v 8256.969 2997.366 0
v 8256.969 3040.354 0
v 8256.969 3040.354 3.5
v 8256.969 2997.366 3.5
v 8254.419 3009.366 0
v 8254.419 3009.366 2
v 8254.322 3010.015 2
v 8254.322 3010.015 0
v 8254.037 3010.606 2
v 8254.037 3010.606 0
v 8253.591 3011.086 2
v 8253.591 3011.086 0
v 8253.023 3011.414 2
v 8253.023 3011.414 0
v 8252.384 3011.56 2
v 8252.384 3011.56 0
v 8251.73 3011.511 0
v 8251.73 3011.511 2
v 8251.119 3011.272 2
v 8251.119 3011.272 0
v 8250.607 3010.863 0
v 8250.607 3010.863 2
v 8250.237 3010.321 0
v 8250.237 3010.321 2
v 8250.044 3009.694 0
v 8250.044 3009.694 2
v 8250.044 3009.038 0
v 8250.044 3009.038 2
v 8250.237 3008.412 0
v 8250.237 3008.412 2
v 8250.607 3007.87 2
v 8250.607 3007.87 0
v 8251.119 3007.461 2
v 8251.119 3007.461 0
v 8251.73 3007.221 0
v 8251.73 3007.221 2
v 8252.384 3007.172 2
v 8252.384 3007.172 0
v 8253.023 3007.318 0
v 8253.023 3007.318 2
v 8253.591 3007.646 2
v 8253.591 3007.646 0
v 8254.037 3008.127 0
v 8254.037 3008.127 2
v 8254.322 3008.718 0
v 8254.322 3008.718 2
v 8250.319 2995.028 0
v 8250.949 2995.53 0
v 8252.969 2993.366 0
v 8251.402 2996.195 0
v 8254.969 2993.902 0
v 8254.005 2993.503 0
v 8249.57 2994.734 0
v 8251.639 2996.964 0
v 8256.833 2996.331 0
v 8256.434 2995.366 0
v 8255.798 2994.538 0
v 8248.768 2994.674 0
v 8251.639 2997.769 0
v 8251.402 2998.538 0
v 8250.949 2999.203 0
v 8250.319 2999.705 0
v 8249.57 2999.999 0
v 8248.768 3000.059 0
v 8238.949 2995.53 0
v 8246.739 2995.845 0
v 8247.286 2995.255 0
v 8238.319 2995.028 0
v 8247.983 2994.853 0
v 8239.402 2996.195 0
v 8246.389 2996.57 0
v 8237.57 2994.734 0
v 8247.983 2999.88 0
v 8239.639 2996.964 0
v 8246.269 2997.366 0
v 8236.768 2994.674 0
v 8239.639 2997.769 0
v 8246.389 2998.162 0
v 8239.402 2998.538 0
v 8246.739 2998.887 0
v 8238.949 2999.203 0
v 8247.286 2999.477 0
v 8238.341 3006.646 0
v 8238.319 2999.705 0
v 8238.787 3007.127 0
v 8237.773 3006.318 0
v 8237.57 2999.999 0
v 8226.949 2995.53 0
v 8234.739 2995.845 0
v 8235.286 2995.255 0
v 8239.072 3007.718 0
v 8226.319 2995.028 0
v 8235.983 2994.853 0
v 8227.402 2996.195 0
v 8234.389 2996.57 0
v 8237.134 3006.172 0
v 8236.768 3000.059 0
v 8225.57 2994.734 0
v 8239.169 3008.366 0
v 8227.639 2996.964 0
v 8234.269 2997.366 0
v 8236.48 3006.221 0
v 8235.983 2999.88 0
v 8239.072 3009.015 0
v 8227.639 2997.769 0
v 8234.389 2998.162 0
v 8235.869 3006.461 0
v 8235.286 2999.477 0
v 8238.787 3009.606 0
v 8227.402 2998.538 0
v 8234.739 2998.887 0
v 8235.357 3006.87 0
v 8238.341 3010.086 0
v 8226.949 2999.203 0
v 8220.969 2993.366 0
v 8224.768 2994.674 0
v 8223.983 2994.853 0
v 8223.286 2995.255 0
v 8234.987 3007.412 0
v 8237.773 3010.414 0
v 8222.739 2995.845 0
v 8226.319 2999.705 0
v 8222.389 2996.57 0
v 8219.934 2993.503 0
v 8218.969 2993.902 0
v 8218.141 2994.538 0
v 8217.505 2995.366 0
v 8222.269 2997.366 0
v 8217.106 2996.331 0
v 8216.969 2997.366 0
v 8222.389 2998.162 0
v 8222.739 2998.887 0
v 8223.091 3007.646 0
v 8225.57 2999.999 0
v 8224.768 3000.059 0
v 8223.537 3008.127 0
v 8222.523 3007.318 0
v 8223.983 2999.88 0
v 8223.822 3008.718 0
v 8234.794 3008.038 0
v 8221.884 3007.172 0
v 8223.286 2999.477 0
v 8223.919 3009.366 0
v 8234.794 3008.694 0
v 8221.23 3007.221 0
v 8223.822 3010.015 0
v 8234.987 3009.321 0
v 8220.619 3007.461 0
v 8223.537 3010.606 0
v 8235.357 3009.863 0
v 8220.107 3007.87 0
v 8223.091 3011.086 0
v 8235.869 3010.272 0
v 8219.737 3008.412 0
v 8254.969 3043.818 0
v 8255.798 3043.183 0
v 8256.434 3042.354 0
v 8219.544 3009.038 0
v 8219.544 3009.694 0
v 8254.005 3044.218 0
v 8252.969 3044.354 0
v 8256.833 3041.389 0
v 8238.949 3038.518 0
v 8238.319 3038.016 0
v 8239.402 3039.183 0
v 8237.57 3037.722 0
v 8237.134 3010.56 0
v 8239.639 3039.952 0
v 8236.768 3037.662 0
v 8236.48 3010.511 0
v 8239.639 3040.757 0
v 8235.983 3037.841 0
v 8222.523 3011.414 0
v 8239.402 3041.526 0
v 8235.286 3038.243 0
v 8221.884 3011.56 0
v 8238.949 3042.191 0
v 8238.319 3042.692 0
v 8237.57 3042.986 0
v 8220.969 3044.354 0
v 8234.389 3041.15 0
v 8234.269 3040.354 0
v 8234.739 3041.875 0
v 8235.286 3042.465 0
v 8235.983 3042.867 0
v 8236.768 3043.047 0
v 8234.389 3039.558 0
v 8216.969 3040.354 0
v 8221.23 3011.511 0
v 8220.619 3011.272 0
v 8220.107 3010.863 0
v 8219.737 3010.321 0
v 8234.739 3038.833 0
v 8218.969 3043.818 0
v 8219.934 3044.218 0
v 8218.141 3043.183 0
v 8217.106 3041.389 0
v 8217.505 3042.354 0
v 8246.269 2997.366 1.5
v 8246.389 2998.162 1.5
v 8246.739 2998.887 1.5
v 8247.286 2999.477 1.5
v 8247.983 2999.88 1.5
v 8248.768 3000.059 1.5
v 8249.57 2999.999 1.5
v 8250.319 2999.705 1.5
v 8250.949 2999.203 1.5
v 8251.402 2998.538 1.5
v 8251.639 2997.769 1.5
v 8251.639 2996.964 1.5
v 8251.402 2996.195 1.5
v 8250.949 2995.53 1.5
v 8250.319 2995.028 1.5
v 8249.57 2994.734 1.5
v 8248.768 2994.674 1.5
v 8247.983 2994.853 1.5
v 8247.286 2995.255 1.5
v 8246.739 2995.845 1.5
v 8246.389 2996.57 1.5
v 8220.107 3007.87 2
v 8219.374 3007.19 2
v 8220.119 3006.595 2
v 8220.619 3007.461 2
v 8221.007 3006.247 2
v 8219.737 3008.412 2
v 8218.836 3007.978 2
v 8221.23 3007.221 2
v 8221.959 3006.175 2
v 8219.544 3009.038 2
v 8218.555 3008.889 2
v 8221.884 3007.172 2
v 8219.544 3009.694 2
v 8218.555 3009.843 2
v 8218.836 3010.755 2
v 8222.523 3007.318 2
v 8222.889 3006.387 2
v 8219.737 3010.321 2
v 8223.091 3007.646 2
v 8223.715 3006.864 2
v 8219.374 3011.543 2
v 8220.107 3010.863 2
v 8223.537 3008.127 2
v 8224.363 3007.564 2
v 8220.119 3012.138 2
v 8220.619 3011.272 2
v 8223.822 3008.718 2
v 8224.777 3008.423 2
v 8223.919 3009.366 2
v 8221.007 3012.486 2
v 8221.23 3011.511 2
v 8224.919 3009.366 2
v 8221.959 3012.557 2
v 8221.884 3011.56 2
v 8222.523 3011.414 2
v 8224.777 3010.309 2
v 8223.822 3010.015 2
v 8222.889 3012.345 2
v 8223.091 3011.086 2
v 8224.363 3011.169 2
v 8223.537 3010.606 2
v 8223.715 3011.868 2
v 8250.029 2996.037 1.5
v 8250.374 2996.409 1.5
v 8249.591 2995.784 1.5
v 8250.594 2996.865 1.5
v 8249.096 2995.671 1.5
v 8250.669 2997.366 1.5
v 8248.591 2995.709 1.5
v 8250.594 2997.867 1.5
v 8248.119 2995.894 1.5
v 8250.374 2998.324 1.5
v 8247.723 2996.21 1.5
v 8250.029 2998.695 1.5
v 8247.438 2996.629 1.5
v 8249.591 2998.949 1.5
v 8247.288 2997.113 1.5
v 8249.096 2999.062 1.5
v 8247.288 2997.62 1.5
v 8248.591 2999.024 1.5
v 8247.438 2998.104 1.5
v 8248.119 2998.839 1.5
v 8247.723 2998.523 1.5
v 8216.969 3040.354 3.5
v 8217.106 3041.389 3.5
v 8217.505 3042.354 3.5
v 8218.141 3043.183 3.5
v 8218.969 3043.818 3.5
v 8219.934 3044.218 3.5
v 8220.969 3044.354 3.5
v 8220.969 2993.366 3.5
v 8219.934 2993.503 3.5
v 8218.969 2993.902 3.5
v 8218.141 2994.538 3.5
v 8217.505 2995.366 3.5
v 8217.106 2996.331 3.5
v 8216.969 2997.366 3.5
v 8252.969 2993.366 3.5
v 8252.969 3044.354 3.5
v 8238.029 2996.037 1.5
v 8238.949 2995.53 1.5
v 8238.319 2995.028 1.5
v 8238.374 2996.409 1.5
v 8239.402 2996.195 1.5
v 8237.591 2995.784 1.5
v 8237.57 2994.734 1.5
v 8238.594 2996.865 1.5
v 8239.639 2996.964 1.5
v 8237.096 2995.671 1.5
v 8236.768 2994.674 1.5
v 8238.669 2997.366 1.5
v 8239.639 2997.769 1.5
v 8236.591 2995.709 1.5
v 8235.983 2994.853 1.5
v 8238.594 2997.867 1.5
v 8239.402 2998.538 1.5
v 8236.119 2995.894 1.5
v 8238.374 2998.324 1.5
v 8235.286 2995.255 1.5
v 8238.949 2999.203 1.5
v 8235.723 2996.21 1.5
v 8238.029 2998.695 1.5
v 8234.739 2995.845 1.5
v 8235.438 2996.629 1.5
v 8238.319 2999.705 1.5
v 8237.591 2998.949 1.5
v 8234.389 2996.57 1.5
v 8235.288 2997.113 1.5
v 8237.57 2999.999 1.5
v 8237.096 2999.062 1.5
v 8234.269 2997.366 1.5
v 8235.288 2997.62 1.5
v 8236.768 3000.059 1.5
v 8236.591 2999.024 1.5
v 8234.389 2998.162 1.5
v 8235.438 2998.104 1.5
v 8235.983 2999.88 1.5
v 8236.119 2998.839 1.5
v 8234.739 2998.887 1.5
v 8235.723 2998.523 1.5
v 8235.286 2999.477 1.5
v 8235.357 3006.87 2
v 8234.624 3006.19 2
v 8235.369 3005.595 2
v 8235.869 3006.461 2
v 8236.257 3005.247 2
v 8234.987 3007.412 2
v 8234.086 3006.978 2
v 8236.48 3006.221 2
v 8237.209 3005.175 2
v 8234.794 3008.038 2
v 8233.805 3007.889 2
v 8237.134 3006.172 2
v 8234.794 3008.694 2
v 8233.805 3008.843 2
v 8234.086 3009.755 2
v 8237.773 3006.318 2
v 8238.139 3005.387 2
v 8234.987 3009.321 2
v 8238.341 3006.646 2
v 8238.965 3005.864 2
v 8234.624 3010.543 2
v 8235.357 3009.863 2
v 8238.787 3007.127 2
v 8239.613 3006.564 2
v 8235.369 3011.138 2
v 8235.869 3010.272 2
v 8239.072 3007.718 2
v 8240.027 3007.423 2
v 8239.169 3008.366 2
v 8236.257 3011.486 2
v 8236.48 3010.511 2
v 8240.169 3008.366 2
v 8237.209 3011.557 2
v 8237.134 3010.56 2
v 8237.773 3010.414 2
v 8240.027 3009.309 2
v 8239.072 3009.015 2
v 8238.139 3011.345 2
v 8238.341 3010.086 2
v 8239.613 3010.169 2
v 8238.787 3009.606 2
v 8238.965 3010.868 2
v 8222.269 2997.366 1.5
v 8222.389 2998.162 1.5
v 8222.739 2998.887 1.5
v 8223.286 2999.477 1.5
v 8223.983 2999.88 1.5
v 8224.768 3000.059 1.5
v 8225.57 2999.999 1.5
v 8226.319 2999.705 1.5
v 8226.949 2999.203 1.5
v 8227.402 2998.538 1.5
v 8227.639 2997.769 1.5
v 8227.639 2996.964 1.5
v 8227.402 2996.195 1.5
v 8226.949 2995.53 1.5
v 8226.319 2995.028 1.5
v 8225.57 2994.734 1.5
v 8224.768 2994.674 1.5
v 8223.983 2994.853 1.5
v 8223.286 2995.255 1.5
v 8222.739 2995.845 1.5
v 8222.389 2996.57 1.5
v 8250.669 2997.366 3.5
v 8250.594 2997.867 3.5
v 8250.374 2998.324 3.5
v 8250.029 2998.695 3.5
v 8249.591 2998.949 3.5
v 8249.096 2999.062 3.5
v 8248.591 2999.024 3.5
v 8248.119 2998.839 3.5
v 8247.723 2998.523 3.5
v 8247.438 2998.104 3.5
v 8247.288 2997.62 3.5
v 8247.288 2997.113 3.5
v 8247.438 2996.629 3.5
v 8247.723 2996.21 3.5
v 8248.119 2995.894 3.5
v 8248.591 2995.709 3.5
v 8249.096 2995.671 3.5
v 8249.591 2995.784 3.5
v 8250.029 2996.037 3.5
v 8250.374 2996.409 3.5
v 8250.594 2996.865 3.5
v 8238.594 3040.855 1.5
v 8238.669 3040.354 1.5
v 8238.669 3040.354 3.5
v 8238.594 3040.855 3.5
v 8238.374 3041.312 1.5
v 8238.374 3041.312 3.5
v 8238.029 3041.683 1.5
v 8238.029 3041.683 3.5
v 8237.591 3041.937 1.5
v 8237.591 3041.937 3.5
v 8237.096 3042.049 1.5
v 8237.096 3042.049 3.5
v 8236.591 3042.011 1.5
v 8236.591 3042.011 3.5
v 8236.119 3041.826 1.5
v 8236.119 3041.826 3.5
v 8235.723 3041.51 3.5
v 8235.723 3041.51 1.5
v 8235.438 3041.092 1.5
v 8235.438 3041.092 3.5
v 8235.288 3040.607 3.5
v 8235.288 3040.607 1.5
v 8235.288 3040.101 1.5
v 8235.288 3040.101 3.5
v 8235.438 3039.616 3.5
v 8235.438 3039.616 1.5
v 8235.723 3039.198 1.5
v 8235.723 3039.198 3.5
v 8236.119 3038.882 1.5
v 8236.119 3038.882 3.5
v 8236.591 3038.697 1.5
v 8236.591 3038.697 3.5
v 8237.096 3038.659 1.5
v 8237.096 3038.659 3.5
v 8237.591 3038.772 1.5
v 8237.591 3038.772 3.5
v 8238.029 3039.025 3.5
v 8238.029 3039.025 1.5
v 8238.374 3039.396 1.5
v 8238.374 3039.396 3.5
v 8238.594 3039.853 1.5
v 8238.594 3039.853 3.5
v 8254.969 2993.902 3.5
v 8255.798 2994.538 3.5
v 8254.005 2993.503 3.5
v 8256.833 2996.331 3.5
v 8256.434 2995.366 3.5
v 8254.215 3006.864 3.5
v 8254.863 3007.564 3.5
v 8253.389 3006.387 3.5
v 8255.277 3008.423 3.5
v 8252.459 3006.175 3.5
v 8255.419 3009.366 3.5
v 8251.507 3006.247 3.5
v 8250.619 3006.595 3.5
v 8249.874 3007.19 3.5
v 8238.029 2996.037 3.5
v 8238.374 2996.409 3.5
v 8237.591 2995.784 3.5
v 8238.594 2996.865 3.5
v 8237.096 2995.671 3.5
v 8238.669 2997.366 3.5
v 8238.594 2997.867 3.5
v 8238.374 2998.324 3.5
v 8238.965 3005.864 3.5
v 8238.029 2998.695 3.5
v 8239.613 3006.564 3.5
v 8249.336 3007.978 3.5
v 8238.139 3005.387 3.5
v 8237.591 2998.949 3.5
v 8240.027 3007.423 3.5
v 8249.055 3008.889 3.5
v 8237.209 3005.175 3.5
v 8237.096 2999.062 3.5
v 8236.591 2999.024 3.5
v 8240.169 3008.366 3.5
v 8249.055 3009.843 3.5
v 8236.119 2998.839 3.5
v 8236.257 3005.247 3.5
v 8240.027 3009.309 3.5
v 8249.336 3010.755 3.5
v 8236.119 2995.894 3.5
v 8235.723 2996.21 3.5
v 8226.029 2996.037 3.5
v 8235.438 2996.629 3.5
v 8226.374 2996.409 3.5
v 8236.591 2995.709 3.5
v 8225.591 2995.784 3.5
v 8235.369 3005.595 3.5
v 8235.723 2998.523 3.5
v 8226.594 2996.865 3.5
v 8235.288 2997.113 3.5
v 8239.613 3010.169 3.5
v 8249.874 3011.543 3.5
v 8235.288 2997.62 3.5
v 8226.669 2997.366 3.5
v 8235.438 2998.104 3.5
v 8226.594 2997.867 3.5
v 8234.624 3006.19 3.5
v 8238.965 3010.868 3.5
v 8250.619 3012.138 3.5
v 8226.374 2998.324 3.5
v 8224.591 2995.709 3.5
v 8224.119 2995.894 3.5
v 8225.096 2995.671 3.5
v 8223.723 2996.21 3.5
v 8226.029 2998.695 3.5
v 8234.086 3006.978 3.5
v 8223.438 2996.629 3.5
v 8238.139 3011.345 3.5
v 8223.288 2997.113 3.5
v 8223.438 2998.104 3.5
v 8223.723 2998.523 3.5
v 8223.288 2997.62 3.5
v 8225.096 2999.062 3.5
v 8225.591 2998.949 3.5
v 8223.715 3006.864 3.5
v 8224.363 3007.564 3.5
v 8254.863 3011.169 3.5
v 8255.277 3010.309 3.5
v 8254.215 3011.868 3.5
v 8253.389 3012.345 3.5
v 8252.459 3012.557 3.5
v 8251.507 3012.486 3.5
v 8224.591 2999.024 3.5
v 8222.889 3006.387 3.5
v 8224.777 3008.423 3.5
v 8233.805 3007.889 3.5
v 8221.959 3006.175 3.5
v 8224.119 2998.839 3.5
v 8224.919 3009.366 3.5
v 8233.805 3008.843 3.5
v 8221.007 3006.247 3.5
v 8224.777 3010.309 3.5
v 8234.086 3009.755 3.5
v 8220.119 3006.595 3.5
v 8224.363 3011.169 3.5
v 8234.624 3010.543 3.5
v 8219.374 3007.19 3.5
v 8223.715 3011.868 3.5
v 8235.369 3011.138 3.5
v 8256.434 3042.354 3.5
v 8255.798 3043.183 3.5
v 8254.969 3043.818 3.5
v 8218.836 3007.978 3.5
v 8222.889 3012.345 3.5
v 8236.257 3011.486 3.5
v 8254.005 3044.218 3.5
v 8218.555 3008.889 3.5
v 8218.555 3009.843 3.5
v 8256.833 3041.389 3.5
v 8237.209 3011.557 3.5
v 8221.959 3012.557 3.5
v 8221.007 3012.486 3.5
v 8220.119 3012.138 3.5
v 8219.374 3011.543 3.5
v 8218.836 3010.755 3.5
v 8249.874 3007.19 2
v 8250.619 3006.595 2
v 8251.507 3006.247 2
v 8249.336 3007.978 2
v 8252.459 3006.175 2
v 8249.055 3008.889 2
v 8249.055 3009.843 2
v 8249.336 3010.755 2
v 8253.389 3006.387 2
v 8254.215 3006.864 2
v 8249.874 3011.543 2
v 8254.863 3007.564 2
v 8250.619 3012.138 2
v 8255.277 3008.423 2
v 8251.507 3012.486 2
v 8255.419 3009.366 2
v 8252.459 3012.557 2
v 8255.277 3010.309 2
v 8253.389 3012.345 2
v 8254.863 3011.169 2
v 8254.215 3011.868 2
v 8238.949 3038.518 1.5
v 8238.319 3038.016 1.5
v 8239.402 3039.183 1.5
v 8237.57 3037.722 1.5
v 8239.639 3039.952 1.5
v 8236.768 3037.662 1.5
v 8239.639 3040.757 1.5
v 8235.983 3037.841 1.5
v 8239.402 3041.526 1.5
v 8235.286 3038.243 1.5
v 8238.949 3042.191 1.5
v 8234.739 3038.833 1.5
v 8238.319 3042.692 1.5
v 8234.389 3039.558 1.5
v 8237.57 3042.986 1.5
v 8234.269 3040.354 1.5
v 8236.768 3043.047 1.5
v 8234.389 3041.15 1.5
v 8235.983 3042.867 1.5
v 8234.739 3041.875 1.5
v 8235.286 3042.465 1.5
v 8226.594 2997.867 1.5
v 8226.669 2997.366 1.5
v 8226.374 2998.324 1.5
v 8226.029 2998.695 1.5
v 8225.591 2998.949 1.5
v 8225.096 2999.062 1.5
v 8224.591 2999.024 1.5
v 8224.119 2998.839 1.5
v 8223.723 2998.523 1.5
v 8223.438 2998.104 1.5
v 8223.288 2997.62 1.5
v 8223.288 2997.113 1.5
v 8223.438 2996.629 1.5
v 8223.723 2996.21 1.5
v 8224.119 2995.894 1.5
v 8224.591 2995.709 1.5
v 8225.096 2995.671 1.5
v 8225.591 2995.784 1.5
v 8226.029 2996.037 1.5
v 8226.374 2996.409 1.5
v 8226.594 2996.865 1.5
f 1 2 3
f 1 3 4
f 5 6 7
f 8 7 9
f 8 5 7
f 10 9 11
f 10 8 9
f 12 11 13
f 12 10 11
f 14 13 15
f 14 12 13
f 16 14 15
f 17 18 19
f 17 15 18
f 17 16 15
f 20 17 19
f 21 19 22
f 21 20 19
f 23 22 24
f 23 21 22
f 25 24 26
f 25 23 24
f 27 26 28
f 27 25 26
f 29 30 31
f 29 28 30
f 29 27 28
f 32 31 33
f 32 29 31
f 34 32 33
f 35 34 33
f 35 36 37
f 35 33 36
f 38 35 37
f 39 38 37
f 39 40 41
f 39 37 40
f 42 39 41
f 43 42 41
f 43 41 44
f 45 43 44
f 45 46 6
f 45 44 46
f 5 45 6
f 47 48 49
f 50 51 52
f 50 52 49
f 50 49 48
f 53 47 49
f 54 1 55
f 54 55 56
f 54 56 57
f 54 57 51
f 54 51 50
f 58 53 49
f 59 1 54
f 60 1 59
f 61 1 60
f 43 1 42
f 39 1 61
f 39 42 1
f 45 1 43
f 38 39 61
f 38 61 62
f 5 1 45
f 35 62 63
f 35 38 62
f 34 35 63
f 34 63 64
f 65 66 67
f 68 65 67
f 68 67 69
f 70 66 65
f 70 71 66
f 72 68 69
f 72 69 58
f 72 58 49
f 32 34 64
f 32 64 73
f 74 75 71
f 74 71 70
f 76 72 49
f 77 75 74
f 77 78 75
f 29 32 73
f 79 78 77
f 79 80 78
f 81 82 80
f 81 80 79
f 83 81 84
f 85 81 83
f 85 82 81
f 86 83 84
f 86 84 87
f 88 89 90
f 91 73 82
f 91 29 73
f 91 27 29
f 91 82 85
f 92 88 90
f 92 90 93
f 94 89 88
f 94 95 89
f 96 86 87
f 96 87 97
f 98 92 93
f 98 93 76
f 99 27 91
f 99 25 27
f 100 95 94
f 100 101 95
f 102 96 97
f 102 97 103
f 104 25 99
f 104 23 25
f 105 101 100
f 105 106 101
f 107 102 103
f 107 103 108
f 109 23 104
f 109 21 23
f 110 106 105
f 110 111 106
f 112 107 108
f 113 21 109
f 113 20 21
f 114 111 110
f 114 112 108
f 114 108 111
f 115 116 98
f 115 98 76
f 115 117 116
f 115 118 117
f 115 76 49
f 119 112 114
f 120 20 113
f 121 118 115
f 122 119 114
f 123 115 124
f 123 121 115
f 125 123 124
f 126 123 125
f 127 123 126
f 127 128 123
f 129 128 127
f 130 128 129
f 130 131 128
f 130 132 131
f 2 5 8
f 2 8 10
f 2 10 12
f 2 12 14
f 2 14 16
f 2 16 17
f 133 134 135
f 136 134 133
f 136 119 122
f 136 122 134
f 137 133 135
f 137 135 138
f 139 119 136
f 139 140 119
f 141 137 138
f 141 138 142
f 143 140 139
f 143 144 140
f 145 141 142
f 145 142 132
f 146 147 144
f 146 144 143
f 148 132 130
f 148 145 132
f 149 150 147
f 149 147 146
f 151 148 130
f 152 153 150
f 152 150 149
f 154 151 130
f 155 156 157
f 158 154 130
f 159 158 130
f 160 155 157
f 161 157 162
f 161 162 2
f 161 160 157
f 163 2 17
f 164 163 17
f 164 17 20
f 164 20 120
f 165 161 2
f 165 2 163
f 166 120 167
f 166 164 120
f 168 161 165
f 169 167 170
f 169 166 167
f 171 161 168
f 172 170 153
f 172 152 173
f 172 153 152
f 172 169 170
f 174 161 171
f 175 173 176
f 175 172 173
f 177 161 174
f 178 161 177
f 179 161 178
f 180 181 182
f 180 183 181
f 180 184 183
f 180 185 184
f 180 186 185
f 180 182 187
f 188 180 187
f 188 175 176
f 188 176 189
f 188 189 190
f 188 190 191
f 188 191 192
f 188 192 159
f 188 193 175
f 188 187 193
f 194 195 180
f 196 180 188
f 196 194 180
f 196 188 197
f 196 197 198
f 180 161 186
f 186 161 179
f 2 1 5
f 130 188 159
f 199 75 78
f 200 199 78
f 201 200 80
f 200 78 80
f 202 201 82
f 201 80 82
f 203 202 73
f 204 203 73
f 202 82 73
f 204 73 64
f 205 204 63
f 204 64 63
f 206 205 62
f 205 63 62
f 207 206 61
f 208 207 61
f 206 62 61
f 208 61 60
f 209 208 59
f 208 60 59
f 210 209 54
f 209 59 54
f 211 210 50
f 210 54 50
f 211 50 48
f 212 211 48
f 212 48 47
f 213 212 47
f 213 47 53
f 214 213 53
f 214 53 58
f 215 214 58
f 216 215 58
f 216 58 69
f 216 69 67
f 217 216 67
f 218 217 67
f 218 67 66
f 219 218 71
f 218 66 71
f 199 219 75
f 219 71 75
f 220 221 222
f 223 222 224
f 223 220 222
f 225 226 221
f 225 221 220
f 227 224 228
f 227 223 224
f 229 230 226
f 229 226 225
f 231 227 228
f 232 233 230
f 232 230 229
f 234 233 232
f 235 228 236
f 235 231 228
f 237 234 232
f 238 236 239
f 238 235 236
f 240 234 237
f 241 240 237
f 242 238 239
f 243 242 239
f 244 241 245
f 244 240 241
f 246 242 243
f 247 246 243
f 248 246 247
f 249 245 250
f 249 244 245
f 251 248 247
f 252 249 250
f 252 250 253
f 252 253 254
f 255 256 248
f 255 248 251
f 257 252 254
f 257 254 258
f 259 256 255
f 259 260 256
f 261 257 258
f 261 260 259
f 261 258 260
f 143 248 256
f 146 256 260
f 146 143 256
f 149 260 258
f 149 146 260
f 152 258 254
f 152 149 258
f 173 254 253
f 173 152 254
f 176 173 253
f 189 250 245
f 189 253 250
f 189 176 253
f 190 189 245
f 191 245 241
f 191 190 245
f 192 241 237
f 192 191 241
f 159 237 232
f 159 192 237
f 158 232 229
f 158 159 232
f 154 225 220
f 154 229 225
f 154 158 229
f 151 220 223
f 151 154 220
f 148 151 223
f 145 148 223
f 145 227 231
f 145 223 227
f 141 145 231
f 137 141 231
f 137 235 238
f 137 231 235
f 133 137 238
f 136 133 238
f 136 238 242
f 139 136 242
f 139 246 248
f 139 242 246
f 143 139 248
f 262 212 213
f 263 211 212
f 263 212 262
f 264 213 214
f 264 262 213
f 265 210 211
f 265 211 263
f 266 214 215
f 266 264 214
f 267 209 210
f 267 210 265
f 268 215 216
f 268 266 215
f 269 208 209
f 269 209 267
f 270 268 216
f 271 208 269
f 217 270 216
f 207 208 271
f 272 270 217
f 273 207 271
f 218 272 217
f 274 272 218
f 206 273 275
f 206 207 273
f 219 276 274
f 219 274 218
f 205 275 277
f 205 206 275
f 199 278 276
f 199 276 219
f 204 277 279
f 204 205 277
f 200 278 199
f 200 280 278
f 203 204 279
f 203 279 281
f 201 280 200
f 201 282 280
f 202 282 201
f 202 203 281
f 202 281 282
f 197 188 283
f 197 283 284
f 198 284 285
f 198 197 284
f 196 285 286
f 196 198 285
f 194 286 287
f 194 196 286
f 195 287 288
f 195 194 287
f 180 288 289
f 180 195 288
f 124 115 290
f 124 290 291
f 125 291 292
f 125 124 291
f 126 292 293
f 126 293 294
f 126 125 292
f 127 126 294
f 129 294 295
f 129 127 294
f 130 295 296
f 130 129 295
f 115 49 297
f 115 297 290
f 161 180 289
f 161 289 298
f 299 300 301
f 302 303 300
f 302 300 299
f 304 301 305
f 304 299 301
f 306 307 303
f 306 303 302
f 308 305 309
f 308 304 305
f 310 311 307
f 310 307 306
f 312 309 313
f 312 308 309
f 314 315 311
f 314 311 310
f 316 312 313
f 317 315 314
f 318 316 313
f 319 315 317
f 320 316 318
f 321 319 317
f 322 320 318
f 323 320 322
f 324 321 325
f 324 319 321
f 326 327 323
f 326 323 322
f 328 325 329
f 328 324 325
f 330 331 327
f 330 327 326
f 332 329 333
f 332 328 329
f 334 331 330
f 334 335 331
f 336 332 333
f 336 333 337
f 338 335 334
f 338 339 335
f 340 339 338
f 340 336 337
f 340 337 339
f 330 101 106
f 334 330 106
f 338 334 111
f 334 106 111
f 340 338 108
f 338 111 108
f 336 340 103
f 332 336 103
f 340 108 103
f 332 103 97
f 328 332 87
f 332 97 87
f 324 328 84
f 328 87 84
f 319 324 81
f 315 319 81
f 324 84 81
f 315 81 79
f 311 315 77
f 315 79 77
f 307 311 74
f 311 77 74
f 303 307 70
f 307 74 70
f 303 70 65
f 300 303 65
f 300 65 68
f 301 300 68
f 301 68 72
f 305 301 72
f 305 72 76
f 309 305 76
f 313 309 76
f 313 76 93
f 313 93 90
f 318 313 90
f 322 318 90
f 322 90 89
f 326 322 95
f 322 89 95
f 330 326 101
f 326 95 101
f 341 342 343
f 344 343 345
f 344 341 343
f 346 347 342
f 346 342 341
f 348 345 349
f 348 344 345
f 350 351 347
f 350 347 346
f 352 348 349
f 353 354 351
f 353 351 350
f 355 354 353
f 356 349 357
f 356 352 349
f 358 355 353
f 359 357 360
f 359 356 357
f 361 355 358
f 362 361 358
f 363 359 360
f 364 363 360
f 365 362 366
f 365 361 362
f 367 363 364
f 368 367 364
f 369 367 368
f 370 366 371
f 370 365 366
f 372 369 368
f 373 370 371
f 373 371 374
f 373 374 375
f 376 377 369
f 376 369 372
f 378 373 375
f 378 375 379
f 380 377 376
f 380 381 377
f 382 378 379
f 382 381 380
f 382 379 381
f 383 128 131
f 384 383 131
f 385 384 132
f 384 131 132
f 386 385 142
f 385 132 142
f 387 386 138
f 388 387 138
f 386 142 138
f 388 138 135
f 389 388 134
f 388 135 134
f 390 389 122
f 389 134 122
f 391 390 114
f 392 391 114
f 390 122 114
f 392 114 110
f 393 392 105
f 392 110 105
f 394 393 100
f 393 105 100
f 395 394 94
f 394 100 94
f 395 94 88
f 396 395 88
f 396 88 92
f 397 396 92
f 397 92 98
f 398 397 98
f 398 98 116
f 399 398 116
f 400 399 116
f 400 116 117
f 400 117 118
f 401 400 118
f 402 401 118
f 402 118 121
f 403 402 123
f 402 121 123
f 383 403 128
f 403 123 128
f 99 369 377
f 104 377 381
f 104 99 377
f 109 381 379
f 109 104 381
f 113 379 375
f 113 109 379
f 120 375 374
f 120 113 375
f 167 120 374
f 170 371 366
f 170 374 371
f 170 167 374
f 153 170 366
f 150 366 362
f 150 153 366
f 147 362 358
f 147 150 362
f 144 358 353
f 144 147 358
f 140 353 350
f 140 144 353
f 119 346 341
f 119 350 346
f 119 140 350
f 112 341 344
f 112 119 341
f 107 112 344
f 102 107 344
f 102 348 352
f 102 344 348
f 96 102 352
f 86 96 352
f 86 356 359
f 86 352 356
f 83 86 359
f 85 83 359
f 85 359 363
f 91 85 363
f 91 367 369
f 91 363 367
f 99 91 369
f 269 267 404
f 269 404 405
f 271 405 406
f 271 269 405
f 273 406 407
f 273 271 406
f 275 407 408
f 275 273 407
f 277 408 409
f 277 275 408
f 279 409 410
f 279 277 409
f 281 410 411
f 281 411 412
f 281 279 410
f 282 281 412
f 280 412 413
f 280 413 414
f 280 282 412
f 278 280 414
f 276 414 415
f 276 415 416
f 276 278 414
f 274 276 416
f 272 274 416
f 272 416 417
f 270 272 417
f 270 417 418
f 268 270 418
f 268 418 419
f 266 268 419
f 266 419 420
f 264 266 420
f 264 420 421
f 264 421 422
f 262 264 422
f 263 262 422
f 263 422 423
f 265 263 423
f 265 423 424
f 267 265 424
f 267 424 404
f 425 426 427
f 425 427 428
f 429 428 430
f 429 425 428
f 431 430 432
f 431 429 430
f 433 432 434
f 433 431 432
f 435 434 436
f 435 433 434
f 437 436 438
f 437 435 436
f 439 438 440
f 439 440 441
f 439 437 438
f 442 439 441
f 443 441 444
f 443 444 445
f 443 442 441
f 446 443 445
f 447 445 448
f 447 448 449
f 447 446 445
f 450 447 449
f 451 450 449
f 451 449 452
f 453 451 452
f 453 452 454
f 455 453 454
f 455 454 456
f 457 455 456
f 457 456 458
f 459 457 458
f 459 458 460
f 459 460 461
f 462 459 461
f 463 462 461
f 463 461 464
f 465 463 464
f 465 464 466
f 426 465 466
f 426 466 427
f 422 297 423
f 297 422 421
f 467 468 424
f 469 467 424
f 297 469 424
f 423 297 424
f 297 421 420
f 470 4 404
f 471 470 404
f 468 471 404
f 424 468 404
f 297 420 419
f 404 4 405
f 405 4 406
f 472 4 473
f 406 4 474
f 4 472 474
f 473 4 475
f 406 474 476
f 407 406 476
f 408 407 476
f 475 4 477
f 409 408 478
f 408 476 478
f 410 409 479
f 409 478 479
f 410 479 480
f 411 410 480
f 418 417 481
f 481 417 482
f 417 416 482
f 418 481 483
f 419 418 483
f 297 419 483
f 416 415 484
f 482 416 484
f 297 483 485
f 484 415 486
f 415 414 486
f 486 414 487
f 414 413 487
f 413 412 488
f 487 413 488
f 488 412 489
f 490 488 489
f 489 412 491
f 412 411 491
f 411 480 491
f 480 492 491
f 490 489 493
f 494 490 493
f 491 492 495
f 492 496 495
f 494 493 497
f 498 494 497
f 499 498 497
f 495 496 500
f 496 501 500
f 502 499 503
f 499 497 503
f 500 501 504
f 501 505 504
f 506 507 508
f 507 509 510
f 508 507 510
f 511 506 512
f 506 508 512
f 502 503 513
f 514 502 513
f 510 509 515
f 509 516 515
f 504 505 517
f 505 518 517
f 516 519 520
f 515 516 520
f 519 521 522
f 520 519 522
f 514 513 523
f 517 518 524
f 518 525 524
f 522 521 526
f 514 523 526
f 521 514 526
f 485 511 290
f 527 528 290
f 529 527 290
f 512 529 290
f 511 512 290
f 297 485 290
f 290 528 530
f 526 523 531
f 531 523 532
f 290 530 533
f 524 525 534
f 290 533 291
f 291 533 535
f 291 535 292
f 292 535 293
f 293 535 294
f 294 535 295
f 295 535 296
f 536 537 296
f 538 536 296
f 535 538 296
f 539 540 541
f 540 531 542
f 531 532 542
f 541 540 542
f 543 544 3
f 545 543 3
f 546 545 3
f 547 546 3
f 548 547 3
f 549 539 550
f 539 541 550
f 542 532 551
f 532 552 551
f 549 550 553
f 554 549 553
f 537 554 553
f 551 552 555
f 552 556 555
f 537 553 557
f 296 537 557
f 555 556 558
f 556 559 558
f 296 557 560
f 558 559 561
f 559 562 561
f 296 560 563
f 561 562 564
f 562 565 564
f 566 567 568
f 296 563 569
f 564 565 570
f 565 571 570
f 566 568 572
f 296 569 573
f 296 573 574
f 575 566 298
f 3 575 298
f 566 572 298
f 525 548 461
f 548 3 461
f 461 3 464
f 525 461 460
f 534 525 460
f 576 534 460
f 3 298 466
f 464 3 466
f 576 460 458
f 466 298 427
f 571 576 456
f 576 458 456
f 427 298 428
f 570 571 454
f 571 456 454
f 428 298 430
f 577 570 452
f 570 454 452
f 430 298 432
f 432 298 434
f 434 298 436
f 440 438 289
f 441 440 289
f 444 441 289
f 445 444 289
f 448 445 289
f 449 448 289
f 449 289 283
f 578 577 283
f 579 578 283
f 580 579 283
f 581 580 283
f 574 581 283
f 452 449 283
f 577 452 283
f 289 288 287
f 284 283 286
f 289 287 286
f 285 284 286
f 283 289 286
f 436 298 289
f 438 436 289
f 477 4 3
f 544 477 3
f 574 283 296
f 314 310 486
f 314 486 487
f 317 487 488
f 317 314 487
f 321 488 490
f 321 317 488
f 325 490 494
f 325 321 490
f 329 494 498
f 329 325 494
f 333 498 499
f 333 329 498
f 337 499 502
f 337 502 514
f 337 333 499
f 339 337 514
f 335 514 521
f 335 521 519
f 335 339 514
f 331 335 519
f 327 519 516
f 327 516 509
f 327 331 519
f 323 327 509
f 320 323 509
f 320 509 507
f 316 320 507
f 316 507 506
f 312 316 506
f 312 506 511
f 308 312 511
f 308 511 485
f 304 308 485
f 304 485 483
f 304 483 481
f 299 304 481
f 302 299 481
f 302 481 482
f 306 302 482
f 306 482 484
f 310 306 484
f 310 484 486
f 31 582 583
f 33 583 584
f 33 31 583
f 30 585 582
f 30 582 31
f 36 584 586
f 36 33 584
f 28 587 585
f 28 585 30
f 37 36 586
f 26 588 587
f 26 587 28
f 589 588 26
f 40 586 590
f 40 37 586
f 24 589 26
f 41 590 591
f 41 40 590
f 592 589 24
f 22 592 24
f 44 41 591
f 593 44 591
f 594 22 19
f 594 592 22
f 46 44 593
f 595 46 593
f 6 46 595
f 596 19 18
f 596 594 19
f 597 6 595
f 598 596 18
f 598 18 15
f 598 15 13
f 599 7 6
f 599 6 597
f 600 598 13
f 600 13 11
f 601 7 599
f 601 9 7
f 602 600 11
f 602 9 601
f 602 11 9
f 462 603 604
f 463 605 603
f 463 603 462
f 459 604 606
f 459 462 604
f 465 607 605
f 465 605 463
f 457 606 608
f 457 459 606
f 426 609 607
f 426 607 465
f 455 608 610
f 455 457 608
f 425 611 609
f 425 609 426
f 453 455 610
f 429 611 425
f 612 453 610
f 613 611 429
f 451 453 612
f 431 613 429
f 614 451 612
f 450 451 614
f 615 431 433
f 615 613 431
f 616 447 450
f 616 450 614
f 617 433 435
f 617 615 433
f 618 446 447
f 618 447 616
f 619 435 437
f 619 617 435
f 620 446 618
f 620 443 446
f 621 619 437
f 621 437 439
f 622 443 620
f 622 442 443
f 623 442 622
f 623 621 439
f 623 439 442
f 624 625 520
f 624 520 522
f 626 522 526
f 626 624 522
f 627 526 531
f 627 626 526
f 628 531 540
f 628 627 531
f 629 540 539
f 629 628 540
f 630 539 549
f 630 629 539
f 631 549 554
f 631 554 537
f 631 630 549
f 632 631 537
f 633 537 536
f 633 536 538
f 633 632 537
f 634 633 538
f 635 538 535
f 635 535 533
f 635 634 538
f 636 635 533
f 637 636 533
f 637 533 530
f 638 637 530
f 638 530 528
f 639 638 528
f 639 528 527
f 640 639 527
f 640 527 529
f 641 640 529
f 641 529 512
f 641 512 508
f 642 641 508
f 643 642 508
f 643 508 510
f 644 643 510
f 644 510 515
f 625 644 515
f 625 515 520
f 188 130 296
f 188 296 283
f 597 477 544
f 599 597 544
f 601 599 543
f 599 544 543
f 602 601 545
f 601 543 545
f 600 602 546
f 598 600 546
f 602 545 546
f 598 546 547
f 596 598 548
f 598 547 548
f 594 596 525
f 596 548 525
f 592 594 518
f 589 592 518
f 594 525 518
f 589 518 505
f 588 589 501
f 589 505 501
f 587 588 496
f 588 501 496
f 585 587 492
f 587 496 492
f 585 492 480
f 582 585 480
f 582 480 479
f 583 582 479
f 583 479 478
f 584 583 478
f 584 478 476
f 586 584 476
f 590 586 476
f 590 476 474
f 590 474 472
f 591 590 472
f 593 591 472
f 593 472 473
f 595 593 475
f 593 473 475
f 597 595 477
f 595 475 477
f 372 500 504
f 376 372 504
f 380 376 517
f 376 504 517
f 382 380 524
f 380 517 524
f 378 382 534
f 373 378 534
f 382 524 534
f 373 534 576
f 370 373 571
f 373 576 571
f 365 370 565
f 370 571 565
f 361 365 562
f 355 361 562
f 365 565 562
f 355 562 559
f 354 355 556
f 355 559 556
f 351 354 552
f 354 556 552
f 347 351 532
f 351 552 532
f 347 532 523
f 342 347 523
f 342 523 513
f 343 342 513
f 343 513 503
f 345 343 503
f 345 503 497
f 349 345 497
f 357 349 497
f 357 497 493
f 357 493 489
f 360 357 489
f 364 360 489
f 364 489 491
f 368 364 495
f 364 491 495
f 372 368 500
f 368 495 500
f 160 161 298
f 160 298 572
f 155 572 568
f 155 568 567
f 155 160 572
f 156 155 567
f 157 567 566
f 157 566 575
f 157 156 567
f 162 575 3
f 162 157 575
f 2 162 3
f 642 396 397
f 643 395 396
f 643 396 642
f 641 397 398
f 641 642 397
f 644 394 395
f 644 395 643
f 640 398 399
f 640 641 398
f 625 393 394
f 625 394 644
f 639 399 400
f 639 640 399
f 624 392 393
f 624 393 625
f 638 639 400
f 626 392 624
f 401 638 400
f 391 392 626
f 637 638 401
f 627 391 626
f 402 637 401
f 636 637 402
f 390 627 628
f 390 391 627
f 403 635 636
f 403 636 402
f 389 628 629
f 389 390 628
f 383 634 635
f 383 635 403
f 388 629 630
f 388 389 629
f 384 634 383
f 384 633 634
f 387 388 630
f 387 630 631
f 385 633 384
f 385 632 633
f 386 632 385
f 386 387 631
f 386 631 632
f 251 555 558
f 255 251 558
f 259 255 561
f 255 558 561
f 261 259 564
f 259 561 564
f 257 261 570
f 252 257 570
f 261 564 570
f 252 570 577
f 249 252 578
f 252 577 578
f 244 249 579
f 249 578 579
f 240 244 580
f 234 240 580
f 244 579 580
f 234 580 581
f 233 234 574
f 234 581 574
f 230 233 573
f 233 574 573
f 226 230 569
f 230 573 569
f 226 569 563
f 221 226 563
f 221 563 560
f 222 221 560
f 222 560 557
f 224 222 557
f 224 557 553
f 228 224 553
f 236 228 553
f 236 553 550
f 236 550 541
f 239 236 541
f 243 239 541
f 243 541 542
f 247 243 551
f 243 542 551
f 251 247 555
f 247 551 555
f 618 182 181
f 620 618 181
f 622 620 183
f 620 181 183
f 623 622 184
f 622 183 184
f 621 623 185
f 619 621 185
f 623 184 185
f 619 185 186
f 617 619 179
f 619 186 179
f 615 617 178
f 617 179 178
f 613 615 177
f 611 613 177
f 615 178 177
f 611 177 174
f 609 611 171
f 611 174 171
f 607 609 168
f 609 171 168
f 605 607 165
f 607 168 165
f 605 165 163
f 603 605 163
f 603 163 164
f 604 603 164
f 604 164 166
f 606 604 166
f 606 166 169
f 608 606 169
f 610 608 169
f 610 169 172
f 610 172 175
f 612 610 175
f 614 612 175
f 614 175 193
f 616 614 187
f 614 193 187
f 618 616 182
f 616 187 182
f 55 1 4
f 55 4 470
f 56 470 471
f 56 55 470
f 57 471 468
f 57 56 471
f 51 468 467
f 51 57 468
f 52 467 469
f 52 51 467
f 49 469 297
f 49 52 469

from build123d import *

# Parameters (mm, degrees)
SKETCH_2_R        = 1.7
SKETCH_2_R_2      = 2.2
EXTRUDE_1_DEPTH   = 3.5
SKETCH_3_R        = 2.7
EXTRUDE_2_DEPTH   = 1.5
EXTRUDE_2_2_DEPTH = 1.5
EXTRUDE_2_3_DEPTH = 1.5
EXTRUDE_2_4_DEPTH = 1.5
SKETCH_4_R        = 3.2
EXTRUDE_3_DEPTH   = 1.5
EXTRUDE_3_2_DEPTH = 1.5
EXTRUDE_3_3_DEPTH = 1.5


with BuildPart() as part:
    # 草图2 → 凸台-拉伸1 (new body)
    with BuildSketch(Plane.XY):
        with BuildLine():
            Line((8220.969436472, 3044.354101623), (8252.969436472, 3044.354101623))
            ThreePointArc((8252.969436472, 3044.354101623), (8255.797863597, 3043.182528748), (8256.969436472, 3040.354101623))
            Line((8256.969436472, 3040.354101623), (8256.969436472, 2997.366275847))
            ThreePointArc((8256.969436472, 2997.366275847), (8255.797863597, 2994.537848723), (8252.969436472, 2993.366275847))
            Line((8252.969436472, 2993.366275847), (8220.969436472, 2993.366275847))
            ThreePointArc((8220.969436472, 2993.366275847), (8218.141009348, 2994.537848723), (8216.969436472, 2997.366275847))
            Line((8216.969436472, 2997.366275847), (8216.969436472, 3040.354101623))
            ThreePointArc((8216.969436472, 3040.354101623), (8218.141009348, 3043.182528748), (8220.969436472, 3044.354101623))
        make_face()
        with Locations((8236.969436473, 3040.354101623)):
            Circle(SKETCH_2_R, mode=Mode.SUBTRACT)
        with Locations((8248.969436472, 2997.366275847)):
            Circle(SKETCH_2_R, mode=Mode.SUBTRACT)
        with Locations((8236.969436472, 2997.366275847)):
            Circle(SKETCH_2_R, mode=Mode.SUBTRACT)
        with Locations((8224.969436472, 2997.366275847)):
            Circle(SKETCH_2_R, mode=Mode.SUBTRACT)
        with Locations((8236.969436473, 3008.366275847)):
            Circle(SKETCH_2_R_2, mode=Mode.SUBTRACT)
        with Locations((8221.719436473, 3009.366275847)):
            Circle(SKETCH_2_R_2, mode=Mode.SUBTRACT)
        with Locations((8252.219436473, 3009.366275847)):
            Circle(SKETCH_2_R_2, mode=Mode.SUBTRACT)
    extrude(amount=EXTRUDE_1_DEPTH)


with BuildPart() as body_2:
    # 草图3 → 凸台-拉伸2 (new body)
    with BuildSketch(Plane(origin=(0, 0, 0), x_dir=(-1, 0, 0), z_dir=(0, 0, -1))):
        with Locations((-8236.969436473, 3040.354101623)):
            Circle(SKETCH_3_R)
    extrude(amount=-EXTRUDE_2_DEPTH)


with BuildPart() as body_3:
    # 草图3 → Extrude 2 2 (new body)
    with BuildSketch(Plane(origin=(0, 0, 0), x_dir=(-1, 0, 0), z_dir=(0, 0, -1))):
        with Locations((-8248.969436472, 2997.366275847)):
            Circle(SKETCH_3_R)
    extrude(amount=-EXTRUDE_2_2_DEPTH)


with BuildPart() as body_4:
    # 草图3 → Extrude 2 3 (new body)
    with BuildSketch(Plane(origin=(0, 0, 0), x_dir=(-1, 0, 0), z_dir=(0, 0, -1))):
        with Locations((-8236.969436472, 2997.366275847)):
            Circle(SKETCH_3_R)
    extrude(amount=-EXTRUDE_2_3_DEPTH)


with BuildPart() as body_5:
    # 草图3 → Extrude 2 4 (new body)
    with BuildSketch(Plane(origin=(0, 0, 0), x_dir=(-1, 0, 0), z_dir=(0, 0, -1))):
        with Locations((-8224.969436472, 2997.366275847)):
            Circle(SKETCH_3_R)
    extrude(amount=-EXTRUDE_2_4_DEPTH)


with BuildPart() as body_6:
    # 草图4 → 凸台-拉伸3 (new body)
    with BuildSketch(Plane.XY.offset(3.5)):
        with Locations((8236.969436473, 3008.366275847)):
            Circle(SKETCH_4_R)
    extrude(amount=-EXTRUDE_3_DEPTH)


with BuildPart() as body_7:
    # 草图4 → Extrude 3 2 (new body)
    with BuildSketch(Plane.XY.offset(3.5)):
        with Locations((8221.719436473, 3009.366275847)):
            Circle(SKETCH_4_R)
    extrude(amount=-EXTRUDE_3_2_DEPTH)


with BuildPart() as body_8:
    # 草图4 → Extrude 3 3 (new body)
    with BuildSketch(Plane.XY.offset(3.5)):
        with Locations((8252.219436473, 3009.366275847)):
            Circle(SKETCH_4_R)
    extrude(amount=-EXTRUDE_3_3_DEPTH)


with BuildPart() as part_1:
    add(part.part)

    # Combine 1: cut body 6, body 8, body 7, body 5, body 4, body 3, body 2
    add(body_6.part, mode=Mode.SUBTRACT)
    add(body_8.part, mode=Mode.SUBTRACT)
    add(body_7.part, mode=Mode.SUBTRACT)
    add(body_5.part, mode=Mode.SUBTRACT)
    add(body_4.part, mode=Mode.SUBTRACT)
    add(body_3.part, mode=Mode.SUBTRACT)
    add(body_2.part, mode=Mode.SUBTRACT)


solid = part_1.part
